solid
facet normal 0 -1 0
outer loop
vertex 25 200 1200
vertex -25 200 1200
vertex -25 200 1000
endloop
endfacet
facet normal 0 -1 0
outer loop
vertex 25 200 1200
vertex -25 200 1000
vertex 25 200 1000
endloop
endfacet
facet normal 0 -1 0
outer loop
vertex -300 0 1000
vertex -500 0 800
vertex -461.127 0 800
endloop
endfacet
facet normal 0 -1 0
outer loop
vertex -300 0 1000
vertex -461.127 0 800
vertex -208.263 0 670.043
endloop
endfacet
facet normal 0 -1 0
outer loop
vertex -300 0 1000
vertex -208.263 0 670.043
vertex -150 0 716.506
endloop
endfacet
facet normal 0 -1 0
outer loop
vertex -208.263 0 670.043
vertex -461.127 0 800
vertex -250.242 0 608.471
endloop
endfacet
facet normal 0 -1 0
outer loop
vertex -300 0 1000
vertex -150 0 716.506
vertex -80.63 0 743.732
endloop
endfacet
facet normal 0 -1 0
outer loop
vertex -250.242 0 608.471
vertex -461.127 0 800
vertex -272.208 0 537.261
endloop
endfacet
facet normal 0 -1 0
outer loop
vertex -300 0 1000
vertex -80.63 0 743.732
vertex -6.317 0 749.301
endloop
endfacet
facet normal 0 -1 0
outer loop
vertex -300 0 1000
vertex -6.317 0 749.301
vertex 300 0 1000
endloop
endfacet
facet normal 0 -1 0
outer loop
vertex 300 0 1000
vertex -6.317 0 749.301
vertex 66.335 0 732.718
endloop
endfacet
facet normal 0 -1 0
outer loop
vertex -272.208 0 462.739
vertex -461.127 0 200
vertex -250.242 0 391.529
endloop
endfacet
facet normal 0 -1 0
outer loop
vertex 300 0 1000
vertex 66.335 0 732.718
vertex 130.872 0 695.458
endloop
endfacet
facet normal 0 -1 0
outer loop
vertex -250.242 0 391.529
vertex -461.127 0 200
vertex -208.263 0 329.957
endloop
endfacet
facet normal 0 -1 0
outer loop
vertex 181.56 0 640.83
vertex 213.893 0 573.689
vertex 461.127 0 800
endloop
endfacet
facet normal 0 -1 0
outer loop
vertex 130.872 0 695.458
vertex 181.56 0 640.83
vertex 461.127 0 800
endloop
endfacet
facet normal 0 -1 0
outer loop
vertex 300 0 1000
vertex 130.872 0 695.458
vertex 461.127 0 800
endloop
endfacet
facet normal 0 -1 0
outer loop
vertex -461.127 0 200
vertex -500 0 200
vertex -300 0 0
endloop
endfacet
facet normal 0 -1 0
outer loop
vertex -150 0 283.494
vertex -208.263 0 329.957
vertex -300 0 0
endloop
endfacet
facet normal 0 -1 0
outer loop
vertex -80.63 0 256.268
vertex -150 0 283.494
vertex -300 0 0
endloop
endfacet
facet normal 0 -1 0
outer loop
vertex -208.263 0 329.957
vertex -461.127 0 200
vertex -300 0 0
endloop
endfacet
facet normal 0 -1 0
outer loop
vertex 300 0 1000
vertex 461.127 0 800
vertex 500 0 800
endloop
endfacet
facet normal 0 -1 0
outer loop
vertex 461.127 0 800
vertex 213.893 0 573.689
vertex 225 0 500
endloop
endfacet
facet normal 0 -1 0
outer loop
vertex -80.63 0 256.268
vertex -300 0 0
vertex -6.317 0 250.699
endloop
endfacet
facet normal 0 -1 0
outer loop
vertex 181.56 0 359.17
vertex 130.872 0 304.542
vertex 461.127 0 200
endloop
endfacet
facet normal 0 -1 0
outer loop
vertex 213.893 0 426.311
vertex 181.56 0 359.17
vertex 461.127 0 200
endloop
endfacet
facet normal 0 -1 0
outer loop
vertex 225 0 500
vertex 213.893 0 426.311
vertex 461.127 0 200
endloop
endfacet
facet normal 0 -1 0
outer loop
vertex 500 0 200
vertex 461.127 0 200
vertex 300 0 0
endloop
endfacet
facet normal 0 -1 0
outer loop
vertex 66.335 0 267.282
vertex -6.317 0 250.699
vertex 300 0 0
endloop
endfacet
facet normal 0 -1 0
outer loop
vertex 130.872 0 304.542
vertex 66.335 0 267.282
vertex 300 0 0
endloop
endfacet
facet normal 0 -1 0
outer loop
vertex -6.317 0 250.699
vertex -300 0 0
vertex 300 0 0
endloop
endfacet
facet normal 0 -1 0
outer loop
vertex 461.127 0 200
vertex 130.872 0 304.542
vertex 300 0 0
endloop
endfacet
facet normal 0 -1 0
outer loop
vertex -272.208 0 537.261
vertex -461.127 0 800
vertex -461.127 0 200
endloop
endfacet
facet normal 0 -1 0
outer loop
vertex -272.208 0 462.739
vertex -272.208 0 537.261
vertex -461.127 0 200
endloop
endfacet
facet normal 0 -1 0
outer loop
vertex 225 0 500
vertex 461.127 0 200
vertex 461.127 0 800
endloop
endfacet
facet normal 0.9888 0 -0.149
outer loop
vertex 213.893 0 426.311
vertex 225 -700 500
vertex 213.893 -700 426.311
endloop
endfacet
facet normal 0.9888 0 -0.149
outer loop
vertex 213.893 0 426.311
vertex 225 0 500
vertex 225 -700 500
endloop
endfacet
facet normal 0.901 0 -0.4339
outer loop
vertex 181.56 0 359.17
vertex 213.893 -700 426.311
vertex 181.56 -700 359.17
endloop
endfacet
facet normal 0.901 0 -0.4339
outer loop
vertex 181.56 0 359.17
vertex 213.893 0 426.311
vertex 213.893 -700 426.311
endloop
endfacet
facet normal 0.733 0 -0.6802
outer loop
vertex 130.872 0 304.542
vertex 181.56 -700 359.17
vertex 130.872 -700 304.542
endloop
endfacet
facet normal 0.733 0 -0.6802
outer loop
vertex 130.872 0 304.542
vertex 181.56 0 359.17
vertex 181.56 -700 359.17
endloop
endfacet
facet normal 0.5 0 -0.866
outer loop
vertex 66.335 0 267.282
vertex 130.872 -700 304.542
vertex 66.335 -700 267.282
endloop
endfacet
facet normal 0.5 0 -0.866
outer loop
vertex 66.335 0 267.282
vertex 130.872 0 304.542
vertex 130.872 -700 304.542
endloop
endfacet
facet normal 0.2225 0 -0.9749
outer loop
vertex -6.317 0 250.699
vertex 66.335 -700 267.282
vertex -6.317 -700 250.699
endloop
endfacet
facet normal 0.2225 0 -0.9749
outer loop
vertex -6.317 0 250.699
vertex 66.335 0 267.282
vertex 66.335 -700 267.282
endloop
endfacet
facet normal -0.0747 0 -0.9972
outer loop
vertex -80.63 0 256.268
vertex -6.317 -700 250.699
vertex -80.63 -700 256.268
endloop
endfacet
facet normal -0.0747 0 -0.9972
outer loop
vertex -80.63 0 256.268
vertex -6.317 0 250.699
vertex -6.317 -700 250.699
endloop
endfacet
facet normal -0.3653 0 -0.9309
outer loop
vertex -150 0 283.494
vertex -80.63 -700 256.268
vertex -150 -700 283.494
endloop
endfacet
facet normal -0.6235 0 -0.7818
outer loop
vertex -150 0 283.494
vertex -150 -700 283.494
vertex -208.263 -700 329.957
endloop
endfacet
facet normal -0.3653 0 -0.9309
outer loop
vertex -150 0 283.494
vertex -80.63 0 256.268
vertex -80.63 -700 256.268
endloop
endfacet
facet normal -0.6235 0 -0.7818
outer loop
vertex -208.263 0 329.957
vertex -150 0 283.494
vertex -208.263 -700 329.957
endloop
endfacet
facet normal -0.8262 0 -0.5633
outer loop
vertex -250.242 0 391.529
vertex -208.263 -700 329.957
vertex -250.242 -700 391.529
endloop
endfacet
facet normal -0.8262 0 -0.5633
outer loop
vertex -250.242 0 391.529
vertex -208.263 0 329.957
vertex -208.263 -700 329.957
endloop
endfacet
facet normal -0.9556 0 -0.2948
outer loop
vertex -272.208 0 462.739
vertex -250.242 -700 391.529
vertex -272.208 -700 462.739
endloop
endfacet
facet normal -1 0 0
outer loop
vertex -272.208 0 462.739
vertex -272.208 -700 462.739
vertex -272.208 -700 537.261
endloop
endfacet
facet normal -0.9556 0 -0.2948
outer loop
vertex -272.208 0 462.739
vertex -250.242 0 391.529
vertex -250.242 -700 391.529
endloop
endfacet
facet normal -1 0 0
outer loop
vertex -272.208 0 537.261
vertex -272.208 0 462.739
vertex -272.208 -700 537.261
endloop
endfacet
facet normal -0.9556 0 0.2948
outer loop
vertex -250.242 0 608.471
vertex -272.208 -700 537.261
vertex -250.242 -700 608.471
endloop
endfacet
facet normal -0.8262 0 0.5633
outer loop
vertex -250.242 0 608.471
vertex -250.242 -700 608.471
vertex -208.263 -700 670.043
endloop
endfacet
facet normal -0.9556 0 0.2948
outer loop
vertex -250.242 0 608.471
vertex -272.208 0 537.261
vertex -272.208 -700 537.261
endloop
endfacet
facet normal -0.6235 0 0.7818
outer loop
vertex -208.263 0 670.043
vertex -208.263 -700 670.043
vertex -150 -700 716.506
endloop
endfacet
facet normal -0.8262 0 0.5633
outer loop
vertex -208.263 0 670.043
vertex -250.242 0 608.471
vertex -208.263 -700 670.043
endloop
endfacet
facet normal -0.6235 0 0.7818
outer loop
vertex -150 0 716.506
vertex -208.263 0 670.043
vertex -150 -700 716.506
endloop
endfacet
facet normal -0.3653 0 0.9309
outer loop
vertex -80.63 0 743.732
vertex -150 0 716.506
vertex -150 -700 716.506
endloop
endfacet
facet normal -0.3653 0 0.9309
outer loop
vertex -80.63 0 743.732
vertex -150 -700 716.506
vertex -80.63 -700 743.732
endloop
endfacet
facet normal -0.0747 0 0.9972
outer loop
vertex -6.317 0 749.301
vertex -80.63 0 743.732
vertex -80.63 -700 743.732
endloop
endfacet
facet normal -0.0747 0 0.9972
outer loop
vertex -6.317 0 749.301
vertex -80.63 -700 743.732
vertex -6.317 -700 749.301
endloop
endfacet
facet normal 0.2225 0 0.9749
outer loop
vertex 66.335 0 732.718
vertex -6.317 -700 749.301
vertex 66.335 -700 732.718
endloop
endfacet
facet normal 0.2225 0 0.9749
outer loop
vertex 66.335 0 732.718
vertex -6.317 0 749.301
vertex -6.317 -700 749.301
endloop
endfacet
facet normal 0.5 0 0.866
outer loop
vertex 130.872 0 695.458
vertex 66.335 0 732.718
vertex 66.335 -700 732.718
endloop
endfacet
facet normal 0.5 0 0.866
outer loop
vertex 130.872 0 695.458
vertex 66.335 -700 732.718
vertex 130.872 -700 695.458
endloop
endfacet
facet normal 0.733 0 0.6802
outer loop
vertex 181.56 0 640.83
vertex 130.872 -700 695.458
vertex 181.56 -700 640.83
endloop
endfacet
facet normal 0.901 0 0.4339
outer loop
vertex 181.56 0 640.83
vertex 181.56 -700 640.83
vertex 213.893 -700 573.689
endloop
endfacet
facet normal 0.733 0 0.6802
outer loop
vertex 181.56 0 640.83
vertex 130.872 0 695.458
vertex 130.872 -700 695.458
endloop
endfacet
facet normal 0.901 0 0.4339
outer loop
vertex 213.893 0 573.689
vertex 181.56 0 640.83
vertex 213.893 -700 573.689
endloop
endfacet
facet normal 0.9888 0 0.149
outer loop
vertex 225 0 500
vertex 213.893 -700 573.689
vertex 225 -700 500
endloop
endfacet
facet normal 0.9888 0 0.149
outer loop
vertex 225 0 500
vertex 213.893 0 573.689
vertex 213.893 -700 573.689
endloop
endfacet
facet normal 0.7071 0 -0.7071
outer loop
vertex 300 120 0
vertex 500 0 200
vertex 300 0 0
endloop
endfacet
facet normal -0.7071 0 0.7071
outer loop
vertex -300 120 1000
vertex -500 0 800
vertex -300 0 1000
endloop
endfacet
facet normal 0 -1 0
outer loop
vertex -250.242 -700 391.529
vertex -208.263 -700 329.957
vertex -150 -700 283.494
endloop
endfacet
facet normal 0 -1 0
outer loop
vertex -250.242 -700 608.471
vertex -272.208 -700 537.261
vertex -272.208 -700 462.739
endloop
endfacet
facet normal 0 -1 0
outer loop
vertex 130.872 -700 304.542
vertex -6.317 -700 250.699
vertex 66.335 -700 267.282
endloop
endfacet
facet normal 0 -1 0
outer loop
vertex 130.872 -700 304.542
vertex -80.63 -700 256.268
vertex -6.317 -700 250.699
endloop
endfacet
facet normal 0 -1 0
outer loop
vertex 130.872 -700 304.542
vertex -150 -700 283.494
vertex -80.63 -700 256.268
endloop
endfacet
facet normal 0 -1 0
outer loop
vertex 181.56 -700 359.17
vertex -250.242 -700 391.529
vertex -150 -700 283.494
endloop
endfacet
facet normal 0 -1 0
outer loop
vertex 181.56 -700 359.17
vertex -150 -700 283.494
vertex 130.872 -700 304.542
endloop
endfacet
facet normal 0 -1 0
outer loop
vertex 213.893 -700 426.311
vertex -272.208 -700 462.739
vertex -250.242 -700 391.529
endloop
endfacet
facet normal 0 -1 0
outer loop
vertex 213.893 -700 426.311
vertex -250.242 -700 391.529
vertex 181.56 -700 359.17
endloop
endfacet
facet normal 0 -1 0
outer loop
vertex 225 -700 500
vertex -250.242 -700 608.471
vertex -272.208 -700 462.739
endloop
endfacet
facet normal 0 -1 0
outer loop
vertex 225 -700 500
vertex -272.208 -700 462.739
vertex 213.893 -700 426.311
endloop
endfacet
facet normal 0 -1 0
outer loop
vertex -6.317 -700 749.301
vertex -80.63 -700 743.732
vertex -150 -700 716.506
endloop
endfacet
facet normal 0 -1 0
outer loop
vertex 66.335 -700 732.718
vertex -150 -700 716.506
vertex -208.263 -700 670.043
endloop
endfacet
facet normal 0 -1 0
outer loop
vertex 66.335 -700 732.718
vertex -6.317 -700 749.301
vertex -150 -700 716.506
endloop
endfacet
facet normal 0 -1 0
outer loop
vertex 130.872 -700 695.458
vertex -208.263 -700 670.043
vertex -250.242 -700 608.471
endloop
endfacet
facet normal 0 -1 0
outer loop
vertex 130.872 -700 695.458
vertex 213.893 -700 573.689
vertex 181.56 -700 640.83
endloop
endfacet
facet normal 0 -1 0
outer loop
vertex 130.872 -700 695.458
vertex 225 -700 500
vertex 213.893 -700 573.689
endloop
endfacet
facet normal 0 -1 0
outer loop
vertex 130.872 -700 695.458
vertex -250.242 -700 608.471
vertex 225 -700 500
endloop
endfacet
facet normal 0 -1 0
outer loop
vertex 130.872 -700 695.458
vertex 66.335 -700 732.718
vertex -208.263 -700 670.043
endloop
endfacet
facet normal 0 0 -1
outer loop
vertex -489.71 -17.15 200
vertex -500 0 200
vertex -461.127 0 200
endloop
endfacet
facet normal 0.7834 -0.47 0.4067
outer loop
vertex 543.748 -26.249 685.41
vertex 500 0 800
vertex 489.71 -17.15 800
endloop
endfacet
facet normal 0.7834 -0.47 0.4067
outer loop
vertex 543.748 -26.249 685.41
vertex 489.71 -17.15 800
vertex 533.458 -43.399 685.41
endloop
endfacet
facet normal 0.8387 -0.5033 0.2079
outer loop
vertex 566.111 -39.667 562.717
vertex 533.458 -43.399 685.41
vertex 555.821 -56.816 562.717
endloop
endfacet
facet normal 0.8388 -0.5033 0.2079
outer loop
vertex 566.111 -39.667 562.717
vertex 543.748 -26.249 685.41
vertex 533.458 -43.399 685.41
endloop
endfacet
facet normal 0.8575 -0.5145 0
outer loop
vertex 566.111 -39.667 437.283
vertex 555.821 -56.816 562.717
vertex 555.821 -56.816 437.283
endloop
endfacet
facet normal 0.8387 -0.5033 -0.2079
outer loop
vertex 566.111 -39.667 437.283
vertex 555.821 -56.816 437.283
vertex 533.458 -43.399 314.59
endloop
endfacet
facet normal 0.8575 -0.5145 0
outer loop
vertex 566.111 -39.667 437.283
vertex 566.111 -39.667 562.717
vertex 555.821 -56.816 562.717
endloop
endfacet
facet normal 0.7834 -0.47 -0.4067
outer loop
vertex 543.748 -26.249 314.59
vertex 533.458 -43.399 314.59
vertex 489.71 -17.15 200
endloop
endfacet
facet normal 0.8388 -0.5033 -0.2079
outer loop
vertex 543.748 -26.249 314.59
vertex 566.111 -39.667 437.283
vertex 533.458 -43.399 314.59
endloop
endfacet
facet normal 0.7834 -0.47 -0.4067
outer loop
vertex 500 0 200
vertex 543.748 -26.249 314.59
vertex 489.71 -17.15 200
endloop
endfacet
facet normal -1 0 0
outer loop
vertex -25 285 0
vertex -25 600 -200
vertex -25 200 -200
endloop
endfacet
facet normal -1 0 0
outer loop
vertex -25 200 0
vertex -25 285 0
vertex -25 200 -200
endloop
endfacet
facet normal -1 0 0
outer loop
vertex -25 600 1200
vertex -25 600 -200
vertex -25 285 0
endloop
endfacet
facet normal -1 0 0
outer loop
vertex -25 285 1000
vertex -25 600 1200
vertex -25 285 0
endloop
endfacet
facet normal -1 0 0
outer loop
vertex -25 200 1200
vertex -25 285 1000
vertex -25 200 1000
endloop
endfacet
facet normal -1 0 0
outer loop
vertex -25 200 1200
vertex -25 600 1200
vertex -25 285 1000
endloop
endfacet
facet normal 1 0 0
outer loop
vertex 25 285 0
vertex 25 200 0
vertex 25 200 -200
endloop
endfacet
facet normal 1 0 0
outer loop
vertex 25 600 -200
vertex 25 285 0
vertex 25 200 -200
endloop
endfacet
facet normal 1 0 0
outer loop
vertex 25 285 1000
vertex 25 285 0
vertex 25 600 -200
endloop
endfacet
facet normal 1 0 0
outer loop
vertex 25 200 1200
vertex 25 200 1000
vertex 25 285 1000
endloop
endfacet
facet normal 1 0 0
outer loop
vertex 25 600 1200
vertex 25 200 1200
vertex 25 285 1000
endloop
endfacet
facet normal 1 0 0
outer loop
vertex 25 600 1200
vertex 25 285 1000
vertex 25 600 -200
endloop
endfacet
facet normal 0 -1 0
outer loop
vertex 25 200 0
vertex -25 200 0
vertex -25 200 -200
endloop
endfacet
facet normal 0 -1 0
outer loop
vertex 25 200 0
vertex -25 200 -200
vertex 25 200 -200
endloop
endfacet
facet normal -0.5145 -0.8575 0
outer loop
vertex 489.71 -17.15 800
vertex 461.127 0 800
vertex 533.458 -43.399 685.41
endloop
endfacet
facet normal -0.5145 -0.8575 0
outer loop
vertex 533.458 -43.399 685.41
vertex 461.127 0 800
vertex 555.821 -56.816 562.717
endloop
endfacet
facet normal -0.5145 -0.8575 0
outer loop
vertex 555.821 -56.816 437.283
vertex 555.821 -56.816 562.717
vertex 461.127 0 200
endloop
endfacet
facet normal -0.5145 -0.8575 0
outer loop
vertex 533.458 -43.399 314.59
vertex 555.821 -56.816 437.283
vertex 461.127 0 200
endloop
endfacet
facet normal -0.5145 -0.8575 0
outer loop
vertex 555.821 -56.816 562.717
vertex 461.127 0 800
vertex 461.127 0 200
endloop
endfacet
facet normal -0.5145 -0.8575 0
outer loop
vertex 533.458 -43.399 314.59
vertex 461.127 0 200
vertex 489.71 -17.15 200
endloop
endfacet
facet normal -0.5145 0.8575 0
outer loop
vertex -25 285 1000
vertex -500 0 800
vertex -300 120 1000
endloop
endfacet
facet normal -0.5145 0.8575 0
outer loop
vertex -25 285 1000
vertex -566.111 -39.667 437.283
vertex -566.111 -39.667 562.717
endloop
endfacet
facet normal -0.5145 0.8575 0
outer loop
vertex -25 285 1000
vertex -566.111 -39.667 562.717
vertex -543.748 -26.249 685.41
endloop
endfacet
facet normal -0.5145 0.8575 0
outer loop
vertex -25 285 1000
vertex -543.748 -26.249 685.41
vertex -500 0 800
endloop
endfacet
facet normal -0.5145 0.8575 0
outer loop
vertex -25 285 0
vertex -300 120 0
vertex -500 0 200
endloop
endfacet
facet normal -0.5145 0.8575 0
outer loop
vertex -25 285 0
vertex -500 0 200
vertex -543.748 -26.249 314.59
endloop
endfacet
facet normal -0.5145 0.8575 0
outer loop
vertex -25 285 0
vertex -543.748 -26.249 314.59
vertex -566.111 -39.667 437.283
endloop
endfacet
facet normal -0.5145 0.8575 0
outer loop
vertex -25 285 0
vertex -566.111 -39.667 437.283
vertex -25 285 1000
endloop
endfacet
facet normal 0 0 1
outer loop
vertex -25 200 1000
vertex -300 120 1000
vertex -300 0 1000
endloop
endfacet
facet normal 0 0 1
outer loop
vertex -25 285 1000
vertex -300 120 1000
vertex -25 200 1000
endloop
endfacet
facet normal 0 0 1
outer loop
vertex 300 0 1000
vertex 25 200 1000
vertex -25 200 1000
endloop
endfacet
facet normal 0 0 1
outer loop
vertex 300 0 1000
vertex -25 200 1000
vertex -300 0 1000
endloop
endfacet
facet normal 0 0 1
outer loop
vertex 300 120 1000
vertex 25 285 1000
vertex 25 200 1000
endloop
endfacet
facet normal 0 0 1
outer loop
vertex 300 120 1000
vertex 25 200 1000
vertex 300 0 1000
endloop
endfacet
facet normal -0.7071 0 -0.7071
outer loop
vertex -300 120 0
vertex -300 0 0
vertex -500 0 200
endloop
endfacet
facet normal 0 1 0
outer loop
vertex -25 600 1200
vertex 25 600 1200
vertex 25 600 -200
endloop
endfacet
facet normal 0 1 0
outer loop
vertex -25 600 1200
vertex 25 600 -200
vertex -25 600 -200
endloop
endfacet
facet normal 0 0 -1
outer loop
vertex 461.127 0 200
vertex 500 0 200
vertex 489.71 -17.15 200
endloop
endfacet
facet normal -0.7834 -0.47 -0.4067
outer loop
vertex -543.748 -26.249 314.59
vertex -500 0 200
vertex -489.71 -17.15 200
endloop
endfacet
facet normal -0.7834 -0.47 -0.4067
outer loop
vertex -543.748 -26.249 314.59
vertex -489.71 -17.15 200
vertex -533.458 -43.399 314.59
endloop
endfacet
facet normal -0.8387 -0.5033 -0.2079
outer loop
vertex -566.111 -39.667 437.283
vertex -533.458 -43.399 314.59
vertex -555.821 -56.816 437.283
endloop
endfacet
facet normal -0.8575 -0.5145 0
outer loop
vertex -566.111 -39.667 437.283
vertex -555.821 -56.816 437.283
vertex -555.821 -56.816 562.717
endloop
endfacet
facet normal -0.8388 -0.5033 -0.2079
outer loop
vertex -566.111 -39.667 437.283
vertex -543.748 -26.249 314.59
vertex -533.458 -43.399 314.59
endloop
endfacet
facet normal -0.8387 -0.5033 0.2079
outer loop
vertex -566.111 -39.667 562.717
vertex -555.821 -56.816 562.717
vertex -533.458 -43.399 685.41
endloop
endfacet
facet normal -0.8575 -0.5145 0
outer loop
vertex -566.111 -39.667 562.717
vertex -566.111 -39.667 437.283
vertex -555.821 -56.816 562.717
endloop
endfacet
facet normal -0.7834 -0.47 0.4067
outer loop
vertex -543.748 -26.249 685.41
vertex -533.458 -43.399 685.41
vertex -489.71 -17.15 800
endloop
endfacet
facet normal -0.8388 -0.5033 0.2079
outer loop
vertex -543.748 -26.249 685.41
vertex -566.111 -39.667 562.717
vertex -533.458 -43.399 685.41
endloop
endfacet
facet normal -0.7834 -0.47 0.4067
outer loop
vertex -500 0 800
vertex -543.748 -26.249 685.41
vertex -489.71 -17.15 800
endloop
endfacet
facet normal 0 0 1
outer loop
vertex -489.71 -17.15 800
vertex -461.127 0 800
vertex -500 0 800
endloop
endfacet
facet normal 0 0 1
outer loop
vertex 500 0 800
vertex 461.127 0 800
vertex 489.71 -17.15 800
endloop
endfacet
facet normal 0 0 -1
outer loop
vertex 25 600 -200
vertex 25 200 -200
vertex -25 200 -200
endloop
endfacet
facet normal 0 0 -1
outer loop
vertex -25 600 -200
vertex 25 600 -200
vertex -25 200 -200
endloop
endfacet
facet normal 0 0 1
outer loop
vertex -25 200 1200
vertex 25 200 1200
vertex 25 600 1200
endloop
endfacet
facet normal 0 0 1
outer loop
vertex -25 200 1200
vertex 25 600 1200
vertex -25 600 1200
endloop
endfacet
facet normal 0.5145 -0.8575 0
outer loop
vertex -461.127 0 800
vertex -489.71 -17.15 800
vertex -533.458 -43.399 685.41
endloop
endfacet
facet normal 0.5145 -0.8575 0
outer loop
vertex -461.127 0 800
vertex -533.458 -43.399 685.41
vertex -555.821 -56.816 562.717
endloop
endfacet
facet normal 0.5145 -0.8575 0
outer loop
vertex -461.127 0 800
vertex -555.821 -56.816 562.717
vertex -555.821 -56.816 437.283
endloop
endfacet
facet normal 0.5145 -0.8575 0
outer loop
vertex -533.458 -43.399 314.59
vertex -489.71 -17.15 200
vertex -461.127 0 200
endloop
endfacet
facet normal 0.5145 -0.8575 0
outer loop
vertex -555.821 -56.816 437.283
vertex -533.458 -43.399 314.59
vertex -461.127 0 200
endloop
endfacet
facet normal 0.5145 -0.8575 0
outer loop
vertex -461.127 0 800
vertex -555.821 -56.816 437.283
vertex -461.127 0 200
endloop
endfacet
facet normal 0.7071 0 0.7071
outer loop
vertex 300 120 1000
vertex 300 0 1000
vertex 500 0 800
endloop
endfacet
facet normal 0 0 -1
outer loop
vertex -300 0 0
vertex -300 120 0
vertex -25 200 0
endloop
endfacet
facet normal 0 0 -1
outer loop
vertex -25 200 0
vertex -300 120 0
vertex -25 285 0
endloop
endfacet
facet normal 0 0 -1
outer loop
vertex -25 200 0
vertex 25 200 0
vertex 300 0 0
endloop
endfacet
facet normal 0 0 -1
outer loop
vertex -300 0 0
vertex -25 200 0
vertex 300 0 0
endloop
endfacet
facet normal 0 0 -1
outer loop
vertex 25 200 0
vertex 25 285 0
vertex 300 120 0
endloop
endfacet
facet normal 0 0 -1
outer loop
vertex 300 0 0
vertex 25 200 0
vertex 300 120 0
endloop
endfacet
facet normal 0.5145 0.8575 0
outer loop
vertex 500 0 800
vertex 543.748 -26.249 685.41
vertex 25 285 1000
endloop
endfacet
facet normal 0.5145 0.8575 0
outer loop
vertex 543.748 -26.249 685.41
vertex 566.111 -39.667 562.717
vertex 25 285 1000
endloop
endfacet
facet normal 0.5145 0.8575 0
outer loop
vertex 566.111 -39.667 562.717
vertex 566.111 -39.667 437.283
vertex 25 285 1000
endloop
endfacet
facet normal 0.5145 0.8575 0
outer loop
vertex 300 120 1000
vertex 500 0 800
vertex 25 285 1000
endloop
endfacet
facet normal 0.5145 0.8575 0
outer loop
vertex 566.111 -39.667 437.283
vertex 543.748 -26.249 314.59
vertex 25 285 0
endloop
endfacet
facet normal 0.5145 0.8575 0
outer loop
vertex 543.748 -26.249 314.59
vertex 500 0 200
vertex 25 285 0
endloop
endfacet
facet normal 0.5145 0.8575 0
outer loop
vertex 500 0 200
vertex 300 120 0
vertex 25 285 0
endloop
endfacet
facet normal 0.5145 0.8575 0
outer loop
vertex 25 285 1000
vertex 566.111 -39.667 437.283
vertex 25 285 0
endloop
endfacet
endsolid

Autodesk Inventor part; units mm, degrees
ref_plane "YZ Plane" through (0, 0, 0) normal (1, 0, 0) x (0, 1, 0)
ref_plane "XZ Plane" through (0, 0, 0) normal (0, 1, 0) x (-1, 0, 0)
ref_plane "XY Plane" through (0, 0, 0) normal (0, 0, 1) x (1, 0, 0)
sketch "Boceto1" plane through (0, 0, 0) normal (0, 0, 1) x (1, 0, 0)
  line L0 (0, 0) -> (-500, 0)
  line L1 (0, 0) -> (500, 0)
  line L2 (0, 0) -> (0, 300)
  line L3 (-500, 0) -> (0, 300)
  line L4 (500, 0) -> (0, 300)
  dimension "d0" = 500
  dimension "d1" = 500
  dimension "d2" = 300
extrude "Extrusión1" add sketch "Boceto1" along normal blind 1000
sketch "Boceto2" plane through (-500, 0, 0) normal (0, -1, 0) x (1, 0, 0)
  line L0 (0, 1000) -> (1000, 1000) projected
  line L1 (0, 1000) -> (0, 800)
  line L2 (0, 0) -> (0, 1000) projected
  line L3 (0, 800) -> (200, 1000)
  line L4 (200, 1000) -> (0, 1000)
  line L5 (1000, 1000) -> (800, 1000)
  line L6 (800, 1000) -> (1000, 800)
  line L7 (1000, 0) -> (1000, 1000) projected
  line L8 (1000, 800) -> (1000, 1000)
  line L9 (0, 0) -> (1000, 0) projected
  line L10 (0, 0) -> (0, 200)
  line L11 (200, 0) -> (0, 0)
  line L12 (200, 0) -> (0, 200)
  line L13 (1000, 0) -> (800, 0)
  line L14 (800, 0) -> (1000, 0)
  line L15 (1000, 200) -> (800, 0)
  point P0 (500, 0)
  dimension "d5" = 200
  dimension "d6" = 45
  dimension "d7" = 200
  dimension "d8" = 45
extrude "Extrusión2" cut sketch "Boceto2" against normal blind 1000 contours L0 L3 L1 | L0 L7 L6 | L12 L9 L2 | L7 L9 L15
sketch "Boceto3" plane through (0, 300, 1000) normal (0.5145, 0.8575, 0) x (0.8575, -0.5145, 0)
  line L0 (583.0952, 800) -> (583.0952, 200) projected
  arc A0 (583.0952, 200) -> (583.0952, 800) centre (63.4799, 500) ccw
  line L1 (583.0952, 800) -> (473.0952, 800)
  line L2 (473.0952, 800) -> (473.0952, 200)
  line L3 (473.0952, 200) -> (583.0952, 200)
  line L4 (583.0952, 200) -> (583.0952, 800)
  point P0 (154.3487, 1000)
  dimension "d11" = 600
  dimension "d12" = 110
extrude "Extrusión3" add sketch "Boceto3" against normal blind 20
sketch "Boceto4" plane through (0, 300, 1000) normal (-0.5145, 0.8575, 0) x (0.8575, 0.5145, 0)
  line L0 (-583.0952, 800) -> (-583.0952, 200) projected
  arc A0 (-583.0952, 800) -> (-583.0952, 200) centre (-63.4799, 500) ccw
  line L1 (-583.0952, 800) -> (-473.0952, 800)
  line L2 (-473.0952, 800) -> (-473.0952, 200)
  line L3 (-473.0952, 200) -> (-583.0952, 200)
  line L4 (-583.0952, 200) -> (-583.0952, 800)
  point P0 (-154.3487, 1000)
  dimension "d15" = 600
  dimension "d16" = 110
extrude "Extrusión4" add sketch "Boceto4" against normal blind 20
sketch "Boceto5" plane through (0, 0, 0) normal (0, 0, -1) x (-1, 0, 0)
  line L0 (-300, 120) -> (0, 300) projected
  line L1 (0, 300) -> (0, 200)
  line L2 (0, 200) -> (25, 200)
  line L3 (0, 200) -> (-25, 200)
  line L4 (-25, 200) -> (-25, 600)
  line L5 (-25, 600) -> (25, 600)
  line L6 (25, 600) -> (25, 200)
  point P0 (0, 0)
  dimension "d19" = 100
  dimension "d20" = 25
  dimension "d21" = 25
  dimension "d22" = 400
extrude "Extrusión5" add sketch "Boceto5" along normal blind 200 and the other way blind 1200
sketch "Boceto6" plane through (-300, 0, 0) normal (0, -1, 0) x (1, 0, 0)
  line L0 (275, 1000) -> (275, 0) projected
  circle A0 centre (275, 500) radius 250
  point P0 (300, 0)
  dimension "d27" = 500
extrude "Extrusión6" add sketch "Boceto6" along normal blind 700
properties part number "Base_rotativa"
